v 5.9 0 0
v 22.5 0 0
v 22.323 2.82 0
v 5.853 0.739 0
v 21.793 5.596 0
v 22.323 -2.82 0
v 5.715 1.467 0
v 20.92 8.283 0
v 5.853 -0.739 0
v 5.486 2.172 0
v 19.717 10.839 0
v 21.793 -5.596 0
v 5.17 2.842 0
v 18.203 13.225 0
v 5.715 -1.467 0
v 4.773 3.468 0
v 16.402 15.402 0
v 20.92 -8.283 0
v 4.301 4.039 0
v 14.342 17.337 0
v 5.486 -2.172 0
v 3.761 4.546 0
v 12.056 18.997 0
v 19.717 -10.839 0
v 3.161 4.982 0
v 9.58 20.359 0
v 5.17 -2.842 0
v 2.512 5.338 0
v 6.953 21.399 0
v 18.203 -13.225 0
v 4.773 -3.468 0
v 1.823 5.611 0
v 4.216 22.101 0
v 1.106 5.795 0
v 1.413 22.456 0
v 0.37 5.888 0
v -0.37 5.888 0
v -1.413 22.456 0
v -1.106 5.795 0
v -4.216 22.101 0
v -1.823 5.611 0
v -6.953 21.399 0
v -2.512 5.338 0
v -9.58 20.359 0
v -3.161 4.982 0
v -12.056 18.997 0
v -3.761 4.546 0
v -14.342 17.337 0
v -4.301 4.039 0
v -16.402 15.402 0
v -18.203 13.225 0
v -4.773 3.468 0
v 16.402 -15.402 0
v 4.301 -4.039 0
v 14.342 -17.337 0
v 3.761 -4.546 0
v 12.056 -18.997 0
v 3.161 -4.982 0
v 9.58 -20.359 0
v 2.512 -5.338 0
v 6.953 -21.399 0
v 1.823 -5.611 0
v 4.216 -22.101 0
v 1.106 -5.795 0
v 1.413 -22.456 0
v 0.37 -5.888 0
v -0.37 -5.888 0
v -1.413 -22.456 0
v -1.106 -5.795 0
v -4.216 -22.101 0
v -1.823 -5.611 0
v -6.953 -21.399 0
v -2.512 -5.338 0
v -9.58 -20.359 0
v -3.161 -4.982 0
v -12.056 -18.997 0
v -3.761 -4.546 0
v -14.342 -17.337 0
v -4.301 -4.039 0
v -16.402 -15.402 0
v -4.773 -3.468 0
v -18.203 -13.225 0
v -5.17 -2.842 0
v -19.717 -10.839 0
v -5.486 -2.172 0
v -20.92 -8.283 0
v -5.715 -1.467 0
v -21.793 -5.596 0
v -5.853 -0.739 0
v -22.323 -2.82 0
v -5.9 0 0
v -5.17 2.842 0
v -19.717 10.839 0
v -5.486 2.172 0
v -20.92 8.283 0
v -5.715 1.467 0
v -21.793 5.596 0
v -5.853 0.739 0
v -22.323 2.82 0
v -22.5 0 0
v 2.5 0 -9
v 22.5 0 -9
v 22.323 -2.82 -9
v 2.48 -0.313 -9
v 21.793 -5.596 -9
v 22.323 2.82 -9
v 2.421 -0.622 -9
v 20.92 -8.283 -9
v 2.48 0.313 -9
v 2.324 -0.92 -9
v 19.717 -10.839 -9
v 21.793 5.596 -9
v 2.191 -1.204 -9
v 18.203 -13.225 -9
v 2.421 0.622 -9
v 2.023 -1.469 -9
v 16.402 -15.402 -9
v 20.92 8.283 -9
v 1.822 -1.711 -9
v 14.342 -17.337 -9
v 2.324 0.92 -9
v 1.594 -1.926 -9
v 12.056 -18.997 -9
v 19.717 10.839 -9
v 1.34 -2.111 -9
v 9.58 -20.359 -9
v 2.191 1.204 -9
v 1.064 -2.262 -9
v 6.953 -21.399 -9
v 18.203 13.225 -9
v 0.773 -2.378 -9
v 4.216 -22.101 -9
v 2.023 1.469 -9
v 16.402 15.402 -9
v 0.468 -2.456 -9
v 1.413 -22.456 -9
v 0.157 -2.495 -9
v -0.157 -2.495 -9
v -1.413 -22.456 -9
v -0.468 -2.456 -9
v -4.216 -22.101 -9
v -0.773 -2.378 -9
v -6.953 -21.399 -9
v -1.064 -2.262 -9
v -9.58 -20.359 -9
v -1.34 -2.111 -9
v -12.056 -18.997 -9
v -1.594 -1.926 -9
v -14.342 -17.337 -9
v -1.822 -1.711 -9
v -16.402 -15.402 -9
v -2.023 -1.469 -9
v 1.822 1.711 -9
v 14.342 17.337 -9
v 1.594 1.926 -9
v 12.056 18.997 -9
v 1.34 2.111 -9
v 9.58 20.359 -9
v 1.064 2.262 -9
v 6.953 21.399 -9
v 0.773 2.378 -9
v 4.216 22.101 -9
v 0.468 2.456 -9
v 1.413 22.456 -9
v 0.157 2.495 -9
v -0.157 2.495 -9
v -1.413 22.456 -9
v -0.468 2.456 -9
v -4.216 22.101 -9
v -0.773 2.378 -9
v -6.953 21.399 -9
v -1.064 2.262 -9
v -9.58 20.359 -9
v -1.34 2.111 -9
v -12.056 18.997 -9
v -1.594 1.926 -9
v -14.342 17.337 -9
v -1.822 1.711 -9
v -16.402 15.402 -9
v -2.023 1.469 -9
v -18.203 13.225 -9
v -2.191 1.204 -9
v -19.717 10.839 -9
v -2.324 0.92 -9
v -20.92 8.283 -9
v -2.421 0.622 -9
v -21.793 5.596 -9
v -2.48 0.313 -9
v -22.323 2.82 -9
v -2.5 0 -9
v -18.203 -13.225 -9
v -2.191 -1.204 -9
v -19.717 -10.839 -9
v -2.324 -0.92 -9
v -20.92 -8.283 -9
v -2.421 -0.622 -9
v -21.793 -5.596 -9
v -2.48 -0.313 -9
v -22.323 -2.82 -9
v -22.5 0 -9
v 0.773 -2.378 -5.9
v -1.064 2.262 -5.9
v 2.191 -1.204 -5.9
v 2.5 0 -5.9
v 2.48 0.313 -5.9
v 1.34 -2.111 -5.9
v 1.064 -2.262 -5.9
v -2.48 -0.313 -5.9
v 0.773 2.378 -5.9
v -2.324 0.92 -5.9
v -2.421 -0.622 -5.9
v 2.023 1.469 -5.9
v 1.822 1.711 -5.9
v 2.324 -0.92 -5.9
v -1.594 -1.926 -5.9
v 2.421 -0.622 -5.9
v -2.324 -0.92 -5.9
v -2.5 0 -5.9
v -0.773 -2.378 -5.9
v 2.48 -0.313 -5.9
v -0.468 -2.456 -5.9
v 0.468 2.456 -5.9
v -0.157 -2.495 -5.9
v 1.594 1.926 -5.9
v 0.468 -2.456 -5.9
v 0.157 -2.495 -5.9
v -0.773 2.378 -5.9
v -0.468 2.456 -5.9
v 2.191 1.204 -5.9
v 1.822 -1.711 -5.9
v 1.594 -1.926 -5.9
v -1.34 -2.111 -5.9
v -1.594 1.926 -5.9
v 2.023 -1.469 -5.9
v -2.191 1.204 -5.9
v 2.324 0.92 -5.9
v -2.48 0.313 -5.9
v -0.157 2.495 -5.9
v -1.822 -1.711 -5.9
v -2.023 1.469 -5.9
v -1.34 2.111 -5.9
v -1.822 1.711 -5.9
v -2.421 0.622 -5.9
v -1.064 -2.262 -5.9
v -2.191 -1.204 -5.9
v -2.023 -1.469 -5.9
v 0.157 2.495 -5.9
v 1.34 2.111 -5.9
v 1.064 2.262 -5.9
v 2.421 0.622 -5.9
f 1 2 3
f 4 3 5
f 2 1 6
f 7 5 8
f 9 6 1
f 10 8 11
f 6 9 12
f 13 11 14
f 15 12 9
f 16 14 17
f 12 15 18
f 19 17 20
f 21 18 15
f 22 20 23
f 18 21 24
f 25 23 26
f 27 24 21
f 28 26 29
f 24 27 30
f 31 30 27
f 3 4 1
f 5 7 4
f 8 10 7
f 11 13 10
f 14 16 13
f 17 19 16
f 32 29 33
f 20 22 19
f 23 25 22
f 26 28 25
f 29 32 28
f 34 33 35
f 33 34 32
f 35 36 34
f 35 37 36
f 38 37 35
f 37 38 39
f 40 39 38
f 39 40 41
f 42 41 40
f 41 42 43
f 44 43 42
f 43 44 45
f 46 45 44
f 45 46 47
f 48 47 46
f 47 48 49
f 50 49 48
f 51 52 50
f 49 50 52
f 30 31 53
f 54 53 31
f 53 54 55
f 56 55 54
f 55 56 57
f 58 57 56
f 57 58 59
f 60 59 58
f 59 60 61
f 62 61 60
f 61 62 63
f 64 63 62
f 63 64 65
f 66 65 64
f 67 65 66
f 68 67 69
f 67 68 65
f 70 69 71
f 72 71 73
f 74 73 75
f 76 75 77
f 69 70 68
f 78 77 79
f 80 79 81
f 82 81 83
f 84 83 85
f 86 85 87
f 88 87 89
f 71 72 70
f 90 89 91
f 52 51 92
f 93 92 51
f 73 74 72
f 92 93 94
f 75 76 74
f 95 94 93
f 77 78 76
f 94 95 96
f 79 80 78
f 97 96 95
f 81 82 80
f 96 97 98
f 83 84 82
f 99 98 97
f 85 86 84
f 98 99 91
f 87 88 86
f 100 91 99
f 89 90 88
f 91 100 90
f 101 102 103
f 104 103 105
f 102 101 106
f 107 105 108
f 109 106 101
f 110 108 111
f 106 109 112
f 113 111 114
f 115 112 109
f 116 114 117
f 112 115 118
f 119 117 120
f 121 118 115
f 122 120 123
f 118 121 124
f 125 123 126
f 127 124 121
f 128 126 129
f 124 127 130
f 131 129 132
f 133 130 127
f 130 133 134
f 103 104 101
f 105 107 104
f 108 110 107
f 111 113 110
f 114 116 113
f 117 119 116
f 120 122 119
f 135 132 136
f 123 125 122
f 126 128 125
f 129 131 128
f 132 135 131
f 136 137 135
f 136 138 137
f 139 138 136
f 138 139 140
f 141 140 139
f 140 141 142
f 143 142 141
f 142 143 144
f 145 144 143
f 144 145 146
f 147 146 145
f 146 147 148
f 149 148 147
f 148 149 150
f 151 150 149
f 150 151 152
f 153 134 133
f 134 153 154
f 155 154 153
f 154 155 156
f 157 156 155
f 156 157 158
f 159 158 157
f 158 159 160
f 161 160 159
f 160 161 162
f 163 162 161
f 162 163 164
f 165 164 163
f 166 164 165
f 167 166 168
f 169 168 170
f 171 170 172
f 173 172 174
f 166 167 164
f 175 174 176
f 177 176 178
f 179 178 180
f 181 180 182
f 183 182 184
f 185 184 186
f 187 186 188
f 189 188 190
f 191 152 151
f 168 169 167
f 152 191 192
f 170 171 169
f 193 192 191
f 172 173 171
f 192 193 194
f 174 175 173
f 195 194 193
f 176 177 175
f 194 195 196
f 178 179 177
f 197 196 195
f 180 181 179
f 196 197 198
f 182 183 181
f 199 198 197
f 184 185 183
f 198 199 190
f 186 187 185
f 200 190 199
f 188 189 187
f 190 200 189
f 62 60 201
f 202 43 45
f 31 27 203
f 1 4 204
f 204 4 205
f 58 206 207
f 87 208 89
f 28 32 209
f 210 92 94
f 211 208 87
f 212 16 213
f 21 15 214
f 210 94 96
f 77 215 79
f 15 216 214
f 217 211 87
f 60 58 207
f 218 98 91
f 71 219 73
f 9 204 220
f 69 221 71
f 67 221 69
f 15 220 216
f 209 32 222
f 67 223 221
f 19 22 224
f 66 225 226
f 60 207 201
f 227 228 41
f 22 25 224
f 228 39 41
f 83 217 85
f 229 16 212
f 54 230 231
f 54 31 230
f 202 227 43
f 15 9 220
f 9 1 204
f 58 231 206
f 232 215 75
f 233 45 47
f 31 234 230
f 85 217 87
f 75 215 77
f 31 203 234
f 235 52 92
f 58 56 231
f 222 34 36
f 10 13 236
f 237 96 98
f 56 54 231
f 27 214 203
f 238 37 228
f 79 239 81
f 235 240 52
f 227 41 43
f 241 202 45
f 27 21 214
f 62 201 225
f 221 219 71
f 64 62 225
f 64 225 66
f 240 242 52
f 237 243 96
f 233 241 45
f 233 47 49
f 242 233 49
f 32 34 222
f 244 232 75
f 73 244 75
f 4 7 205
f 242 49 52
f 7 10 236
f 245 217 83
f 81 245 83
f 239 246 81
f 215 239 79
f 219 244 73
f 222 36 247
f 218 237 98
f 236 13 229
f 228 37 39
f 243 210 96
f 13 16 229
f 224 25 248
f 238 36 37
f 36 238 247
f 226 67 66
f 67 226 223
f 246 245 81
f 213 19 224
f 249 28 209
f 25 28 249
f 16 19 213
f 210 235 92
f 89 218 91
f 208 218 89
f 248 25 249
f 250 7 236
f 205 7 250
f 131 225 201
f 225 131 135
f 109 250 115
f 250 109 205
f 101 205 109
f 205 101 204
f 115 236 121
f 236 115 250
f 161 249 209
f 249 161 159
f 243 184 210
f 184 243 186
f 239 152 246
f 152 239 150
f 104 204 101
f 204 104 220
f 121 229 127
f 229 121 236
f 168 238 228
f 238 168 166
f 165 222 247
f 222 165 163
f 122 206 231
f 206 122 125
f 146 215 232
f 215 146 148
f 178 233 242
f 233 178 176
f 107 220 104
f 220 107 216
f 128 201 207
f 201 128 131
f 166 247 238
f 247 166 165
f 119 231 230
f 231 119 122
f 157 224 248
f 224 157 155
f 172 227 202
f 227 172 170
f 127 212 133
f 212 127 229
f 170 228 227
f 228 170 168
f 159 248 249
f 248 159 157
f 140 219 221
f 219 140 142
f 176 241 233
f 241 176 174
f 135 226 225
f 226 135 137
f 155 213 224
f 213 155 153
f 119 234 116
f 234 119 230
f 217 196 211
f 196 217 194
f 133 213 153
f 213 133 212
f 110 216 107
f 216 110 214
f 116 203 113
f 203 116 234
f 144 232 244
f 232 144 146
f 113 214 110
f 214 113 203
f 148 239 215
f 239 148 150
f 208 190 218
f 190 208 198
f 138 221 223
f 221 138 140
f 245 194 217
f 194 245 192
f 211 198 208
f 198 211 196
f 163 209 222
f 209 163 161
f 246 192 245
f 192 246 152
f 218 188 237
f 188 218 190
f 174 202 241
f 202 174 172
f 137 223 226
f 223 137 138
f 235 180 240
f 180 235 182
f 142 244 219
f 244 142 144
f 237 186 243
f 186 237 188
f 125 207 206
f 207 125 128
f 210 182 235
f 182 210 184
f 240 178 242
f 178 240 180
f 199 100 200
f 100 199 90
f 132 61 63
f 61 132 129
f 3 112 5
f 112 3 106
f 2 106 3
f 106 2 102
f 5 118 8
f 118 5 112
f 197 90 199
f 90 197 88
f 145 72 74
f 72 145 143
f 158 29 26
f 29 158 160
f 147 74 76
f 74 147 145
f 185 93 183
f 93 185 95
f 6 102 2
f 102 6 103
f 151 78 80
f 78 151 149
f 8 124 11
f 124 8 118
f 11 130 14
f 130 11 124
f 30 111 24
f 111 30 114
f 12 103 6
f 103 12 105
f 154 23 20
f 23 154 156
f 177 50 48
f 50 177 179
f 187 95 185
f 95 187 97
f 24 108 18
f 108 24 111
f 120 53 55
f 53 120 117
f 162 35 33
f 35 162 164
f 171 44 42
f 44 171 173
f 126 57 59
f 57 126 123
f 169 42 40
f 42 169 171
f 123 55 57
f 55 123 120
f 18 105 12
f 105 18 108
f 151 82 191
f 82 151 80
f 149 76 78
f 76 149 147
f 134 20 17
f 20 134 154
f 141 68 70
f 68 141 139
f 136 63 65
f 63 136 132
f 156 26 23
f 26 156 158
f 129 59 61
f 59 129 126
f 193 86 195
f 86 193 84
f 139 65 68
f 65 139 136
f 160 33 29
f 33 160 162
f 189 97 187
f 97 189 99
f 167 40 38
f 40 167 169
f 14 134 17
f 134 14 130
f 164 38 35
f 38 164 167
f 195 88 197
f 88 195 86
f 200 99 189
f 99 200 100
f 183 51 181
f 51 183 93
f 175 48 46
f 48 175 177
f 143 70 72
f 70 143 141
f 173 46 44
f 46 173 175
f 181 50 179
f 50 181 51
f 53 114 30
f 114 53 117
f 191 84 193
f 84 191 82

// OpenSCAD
$fn = 50;


difference() {
	union() {
		translate(v = [0, 0, -9.0000000000]) {
			cylinder(h = 9, r = 22.5000000000);
		}
	}
	union() {
		translate(v = [0, 0, 0]) {
			rotate(a = [0, 0, 0]) {
				difference() {
					union() {
						#translate(v = [0, 0, -9.0000000000]) {
							cylinder(h = 9, r = 2.2500000000);
						}
						#translate(v = [0, 0, -5.9000000000]) {
							cylinder(h = 5.9000000000, r1 = 2.5000000000, r2 = 5.9000000000);
						}
						#translate(v = [0, 0, -9.0000000000]) {
							cylinder(h = 9, r = 2.5000000000);
						}
						#translate(v = [0, 0, -9.0000000000]) {
							cylinder(h = 9, r = 2.2500000000);
						}
					}
					union();
				}
			}
		}
	}
}
